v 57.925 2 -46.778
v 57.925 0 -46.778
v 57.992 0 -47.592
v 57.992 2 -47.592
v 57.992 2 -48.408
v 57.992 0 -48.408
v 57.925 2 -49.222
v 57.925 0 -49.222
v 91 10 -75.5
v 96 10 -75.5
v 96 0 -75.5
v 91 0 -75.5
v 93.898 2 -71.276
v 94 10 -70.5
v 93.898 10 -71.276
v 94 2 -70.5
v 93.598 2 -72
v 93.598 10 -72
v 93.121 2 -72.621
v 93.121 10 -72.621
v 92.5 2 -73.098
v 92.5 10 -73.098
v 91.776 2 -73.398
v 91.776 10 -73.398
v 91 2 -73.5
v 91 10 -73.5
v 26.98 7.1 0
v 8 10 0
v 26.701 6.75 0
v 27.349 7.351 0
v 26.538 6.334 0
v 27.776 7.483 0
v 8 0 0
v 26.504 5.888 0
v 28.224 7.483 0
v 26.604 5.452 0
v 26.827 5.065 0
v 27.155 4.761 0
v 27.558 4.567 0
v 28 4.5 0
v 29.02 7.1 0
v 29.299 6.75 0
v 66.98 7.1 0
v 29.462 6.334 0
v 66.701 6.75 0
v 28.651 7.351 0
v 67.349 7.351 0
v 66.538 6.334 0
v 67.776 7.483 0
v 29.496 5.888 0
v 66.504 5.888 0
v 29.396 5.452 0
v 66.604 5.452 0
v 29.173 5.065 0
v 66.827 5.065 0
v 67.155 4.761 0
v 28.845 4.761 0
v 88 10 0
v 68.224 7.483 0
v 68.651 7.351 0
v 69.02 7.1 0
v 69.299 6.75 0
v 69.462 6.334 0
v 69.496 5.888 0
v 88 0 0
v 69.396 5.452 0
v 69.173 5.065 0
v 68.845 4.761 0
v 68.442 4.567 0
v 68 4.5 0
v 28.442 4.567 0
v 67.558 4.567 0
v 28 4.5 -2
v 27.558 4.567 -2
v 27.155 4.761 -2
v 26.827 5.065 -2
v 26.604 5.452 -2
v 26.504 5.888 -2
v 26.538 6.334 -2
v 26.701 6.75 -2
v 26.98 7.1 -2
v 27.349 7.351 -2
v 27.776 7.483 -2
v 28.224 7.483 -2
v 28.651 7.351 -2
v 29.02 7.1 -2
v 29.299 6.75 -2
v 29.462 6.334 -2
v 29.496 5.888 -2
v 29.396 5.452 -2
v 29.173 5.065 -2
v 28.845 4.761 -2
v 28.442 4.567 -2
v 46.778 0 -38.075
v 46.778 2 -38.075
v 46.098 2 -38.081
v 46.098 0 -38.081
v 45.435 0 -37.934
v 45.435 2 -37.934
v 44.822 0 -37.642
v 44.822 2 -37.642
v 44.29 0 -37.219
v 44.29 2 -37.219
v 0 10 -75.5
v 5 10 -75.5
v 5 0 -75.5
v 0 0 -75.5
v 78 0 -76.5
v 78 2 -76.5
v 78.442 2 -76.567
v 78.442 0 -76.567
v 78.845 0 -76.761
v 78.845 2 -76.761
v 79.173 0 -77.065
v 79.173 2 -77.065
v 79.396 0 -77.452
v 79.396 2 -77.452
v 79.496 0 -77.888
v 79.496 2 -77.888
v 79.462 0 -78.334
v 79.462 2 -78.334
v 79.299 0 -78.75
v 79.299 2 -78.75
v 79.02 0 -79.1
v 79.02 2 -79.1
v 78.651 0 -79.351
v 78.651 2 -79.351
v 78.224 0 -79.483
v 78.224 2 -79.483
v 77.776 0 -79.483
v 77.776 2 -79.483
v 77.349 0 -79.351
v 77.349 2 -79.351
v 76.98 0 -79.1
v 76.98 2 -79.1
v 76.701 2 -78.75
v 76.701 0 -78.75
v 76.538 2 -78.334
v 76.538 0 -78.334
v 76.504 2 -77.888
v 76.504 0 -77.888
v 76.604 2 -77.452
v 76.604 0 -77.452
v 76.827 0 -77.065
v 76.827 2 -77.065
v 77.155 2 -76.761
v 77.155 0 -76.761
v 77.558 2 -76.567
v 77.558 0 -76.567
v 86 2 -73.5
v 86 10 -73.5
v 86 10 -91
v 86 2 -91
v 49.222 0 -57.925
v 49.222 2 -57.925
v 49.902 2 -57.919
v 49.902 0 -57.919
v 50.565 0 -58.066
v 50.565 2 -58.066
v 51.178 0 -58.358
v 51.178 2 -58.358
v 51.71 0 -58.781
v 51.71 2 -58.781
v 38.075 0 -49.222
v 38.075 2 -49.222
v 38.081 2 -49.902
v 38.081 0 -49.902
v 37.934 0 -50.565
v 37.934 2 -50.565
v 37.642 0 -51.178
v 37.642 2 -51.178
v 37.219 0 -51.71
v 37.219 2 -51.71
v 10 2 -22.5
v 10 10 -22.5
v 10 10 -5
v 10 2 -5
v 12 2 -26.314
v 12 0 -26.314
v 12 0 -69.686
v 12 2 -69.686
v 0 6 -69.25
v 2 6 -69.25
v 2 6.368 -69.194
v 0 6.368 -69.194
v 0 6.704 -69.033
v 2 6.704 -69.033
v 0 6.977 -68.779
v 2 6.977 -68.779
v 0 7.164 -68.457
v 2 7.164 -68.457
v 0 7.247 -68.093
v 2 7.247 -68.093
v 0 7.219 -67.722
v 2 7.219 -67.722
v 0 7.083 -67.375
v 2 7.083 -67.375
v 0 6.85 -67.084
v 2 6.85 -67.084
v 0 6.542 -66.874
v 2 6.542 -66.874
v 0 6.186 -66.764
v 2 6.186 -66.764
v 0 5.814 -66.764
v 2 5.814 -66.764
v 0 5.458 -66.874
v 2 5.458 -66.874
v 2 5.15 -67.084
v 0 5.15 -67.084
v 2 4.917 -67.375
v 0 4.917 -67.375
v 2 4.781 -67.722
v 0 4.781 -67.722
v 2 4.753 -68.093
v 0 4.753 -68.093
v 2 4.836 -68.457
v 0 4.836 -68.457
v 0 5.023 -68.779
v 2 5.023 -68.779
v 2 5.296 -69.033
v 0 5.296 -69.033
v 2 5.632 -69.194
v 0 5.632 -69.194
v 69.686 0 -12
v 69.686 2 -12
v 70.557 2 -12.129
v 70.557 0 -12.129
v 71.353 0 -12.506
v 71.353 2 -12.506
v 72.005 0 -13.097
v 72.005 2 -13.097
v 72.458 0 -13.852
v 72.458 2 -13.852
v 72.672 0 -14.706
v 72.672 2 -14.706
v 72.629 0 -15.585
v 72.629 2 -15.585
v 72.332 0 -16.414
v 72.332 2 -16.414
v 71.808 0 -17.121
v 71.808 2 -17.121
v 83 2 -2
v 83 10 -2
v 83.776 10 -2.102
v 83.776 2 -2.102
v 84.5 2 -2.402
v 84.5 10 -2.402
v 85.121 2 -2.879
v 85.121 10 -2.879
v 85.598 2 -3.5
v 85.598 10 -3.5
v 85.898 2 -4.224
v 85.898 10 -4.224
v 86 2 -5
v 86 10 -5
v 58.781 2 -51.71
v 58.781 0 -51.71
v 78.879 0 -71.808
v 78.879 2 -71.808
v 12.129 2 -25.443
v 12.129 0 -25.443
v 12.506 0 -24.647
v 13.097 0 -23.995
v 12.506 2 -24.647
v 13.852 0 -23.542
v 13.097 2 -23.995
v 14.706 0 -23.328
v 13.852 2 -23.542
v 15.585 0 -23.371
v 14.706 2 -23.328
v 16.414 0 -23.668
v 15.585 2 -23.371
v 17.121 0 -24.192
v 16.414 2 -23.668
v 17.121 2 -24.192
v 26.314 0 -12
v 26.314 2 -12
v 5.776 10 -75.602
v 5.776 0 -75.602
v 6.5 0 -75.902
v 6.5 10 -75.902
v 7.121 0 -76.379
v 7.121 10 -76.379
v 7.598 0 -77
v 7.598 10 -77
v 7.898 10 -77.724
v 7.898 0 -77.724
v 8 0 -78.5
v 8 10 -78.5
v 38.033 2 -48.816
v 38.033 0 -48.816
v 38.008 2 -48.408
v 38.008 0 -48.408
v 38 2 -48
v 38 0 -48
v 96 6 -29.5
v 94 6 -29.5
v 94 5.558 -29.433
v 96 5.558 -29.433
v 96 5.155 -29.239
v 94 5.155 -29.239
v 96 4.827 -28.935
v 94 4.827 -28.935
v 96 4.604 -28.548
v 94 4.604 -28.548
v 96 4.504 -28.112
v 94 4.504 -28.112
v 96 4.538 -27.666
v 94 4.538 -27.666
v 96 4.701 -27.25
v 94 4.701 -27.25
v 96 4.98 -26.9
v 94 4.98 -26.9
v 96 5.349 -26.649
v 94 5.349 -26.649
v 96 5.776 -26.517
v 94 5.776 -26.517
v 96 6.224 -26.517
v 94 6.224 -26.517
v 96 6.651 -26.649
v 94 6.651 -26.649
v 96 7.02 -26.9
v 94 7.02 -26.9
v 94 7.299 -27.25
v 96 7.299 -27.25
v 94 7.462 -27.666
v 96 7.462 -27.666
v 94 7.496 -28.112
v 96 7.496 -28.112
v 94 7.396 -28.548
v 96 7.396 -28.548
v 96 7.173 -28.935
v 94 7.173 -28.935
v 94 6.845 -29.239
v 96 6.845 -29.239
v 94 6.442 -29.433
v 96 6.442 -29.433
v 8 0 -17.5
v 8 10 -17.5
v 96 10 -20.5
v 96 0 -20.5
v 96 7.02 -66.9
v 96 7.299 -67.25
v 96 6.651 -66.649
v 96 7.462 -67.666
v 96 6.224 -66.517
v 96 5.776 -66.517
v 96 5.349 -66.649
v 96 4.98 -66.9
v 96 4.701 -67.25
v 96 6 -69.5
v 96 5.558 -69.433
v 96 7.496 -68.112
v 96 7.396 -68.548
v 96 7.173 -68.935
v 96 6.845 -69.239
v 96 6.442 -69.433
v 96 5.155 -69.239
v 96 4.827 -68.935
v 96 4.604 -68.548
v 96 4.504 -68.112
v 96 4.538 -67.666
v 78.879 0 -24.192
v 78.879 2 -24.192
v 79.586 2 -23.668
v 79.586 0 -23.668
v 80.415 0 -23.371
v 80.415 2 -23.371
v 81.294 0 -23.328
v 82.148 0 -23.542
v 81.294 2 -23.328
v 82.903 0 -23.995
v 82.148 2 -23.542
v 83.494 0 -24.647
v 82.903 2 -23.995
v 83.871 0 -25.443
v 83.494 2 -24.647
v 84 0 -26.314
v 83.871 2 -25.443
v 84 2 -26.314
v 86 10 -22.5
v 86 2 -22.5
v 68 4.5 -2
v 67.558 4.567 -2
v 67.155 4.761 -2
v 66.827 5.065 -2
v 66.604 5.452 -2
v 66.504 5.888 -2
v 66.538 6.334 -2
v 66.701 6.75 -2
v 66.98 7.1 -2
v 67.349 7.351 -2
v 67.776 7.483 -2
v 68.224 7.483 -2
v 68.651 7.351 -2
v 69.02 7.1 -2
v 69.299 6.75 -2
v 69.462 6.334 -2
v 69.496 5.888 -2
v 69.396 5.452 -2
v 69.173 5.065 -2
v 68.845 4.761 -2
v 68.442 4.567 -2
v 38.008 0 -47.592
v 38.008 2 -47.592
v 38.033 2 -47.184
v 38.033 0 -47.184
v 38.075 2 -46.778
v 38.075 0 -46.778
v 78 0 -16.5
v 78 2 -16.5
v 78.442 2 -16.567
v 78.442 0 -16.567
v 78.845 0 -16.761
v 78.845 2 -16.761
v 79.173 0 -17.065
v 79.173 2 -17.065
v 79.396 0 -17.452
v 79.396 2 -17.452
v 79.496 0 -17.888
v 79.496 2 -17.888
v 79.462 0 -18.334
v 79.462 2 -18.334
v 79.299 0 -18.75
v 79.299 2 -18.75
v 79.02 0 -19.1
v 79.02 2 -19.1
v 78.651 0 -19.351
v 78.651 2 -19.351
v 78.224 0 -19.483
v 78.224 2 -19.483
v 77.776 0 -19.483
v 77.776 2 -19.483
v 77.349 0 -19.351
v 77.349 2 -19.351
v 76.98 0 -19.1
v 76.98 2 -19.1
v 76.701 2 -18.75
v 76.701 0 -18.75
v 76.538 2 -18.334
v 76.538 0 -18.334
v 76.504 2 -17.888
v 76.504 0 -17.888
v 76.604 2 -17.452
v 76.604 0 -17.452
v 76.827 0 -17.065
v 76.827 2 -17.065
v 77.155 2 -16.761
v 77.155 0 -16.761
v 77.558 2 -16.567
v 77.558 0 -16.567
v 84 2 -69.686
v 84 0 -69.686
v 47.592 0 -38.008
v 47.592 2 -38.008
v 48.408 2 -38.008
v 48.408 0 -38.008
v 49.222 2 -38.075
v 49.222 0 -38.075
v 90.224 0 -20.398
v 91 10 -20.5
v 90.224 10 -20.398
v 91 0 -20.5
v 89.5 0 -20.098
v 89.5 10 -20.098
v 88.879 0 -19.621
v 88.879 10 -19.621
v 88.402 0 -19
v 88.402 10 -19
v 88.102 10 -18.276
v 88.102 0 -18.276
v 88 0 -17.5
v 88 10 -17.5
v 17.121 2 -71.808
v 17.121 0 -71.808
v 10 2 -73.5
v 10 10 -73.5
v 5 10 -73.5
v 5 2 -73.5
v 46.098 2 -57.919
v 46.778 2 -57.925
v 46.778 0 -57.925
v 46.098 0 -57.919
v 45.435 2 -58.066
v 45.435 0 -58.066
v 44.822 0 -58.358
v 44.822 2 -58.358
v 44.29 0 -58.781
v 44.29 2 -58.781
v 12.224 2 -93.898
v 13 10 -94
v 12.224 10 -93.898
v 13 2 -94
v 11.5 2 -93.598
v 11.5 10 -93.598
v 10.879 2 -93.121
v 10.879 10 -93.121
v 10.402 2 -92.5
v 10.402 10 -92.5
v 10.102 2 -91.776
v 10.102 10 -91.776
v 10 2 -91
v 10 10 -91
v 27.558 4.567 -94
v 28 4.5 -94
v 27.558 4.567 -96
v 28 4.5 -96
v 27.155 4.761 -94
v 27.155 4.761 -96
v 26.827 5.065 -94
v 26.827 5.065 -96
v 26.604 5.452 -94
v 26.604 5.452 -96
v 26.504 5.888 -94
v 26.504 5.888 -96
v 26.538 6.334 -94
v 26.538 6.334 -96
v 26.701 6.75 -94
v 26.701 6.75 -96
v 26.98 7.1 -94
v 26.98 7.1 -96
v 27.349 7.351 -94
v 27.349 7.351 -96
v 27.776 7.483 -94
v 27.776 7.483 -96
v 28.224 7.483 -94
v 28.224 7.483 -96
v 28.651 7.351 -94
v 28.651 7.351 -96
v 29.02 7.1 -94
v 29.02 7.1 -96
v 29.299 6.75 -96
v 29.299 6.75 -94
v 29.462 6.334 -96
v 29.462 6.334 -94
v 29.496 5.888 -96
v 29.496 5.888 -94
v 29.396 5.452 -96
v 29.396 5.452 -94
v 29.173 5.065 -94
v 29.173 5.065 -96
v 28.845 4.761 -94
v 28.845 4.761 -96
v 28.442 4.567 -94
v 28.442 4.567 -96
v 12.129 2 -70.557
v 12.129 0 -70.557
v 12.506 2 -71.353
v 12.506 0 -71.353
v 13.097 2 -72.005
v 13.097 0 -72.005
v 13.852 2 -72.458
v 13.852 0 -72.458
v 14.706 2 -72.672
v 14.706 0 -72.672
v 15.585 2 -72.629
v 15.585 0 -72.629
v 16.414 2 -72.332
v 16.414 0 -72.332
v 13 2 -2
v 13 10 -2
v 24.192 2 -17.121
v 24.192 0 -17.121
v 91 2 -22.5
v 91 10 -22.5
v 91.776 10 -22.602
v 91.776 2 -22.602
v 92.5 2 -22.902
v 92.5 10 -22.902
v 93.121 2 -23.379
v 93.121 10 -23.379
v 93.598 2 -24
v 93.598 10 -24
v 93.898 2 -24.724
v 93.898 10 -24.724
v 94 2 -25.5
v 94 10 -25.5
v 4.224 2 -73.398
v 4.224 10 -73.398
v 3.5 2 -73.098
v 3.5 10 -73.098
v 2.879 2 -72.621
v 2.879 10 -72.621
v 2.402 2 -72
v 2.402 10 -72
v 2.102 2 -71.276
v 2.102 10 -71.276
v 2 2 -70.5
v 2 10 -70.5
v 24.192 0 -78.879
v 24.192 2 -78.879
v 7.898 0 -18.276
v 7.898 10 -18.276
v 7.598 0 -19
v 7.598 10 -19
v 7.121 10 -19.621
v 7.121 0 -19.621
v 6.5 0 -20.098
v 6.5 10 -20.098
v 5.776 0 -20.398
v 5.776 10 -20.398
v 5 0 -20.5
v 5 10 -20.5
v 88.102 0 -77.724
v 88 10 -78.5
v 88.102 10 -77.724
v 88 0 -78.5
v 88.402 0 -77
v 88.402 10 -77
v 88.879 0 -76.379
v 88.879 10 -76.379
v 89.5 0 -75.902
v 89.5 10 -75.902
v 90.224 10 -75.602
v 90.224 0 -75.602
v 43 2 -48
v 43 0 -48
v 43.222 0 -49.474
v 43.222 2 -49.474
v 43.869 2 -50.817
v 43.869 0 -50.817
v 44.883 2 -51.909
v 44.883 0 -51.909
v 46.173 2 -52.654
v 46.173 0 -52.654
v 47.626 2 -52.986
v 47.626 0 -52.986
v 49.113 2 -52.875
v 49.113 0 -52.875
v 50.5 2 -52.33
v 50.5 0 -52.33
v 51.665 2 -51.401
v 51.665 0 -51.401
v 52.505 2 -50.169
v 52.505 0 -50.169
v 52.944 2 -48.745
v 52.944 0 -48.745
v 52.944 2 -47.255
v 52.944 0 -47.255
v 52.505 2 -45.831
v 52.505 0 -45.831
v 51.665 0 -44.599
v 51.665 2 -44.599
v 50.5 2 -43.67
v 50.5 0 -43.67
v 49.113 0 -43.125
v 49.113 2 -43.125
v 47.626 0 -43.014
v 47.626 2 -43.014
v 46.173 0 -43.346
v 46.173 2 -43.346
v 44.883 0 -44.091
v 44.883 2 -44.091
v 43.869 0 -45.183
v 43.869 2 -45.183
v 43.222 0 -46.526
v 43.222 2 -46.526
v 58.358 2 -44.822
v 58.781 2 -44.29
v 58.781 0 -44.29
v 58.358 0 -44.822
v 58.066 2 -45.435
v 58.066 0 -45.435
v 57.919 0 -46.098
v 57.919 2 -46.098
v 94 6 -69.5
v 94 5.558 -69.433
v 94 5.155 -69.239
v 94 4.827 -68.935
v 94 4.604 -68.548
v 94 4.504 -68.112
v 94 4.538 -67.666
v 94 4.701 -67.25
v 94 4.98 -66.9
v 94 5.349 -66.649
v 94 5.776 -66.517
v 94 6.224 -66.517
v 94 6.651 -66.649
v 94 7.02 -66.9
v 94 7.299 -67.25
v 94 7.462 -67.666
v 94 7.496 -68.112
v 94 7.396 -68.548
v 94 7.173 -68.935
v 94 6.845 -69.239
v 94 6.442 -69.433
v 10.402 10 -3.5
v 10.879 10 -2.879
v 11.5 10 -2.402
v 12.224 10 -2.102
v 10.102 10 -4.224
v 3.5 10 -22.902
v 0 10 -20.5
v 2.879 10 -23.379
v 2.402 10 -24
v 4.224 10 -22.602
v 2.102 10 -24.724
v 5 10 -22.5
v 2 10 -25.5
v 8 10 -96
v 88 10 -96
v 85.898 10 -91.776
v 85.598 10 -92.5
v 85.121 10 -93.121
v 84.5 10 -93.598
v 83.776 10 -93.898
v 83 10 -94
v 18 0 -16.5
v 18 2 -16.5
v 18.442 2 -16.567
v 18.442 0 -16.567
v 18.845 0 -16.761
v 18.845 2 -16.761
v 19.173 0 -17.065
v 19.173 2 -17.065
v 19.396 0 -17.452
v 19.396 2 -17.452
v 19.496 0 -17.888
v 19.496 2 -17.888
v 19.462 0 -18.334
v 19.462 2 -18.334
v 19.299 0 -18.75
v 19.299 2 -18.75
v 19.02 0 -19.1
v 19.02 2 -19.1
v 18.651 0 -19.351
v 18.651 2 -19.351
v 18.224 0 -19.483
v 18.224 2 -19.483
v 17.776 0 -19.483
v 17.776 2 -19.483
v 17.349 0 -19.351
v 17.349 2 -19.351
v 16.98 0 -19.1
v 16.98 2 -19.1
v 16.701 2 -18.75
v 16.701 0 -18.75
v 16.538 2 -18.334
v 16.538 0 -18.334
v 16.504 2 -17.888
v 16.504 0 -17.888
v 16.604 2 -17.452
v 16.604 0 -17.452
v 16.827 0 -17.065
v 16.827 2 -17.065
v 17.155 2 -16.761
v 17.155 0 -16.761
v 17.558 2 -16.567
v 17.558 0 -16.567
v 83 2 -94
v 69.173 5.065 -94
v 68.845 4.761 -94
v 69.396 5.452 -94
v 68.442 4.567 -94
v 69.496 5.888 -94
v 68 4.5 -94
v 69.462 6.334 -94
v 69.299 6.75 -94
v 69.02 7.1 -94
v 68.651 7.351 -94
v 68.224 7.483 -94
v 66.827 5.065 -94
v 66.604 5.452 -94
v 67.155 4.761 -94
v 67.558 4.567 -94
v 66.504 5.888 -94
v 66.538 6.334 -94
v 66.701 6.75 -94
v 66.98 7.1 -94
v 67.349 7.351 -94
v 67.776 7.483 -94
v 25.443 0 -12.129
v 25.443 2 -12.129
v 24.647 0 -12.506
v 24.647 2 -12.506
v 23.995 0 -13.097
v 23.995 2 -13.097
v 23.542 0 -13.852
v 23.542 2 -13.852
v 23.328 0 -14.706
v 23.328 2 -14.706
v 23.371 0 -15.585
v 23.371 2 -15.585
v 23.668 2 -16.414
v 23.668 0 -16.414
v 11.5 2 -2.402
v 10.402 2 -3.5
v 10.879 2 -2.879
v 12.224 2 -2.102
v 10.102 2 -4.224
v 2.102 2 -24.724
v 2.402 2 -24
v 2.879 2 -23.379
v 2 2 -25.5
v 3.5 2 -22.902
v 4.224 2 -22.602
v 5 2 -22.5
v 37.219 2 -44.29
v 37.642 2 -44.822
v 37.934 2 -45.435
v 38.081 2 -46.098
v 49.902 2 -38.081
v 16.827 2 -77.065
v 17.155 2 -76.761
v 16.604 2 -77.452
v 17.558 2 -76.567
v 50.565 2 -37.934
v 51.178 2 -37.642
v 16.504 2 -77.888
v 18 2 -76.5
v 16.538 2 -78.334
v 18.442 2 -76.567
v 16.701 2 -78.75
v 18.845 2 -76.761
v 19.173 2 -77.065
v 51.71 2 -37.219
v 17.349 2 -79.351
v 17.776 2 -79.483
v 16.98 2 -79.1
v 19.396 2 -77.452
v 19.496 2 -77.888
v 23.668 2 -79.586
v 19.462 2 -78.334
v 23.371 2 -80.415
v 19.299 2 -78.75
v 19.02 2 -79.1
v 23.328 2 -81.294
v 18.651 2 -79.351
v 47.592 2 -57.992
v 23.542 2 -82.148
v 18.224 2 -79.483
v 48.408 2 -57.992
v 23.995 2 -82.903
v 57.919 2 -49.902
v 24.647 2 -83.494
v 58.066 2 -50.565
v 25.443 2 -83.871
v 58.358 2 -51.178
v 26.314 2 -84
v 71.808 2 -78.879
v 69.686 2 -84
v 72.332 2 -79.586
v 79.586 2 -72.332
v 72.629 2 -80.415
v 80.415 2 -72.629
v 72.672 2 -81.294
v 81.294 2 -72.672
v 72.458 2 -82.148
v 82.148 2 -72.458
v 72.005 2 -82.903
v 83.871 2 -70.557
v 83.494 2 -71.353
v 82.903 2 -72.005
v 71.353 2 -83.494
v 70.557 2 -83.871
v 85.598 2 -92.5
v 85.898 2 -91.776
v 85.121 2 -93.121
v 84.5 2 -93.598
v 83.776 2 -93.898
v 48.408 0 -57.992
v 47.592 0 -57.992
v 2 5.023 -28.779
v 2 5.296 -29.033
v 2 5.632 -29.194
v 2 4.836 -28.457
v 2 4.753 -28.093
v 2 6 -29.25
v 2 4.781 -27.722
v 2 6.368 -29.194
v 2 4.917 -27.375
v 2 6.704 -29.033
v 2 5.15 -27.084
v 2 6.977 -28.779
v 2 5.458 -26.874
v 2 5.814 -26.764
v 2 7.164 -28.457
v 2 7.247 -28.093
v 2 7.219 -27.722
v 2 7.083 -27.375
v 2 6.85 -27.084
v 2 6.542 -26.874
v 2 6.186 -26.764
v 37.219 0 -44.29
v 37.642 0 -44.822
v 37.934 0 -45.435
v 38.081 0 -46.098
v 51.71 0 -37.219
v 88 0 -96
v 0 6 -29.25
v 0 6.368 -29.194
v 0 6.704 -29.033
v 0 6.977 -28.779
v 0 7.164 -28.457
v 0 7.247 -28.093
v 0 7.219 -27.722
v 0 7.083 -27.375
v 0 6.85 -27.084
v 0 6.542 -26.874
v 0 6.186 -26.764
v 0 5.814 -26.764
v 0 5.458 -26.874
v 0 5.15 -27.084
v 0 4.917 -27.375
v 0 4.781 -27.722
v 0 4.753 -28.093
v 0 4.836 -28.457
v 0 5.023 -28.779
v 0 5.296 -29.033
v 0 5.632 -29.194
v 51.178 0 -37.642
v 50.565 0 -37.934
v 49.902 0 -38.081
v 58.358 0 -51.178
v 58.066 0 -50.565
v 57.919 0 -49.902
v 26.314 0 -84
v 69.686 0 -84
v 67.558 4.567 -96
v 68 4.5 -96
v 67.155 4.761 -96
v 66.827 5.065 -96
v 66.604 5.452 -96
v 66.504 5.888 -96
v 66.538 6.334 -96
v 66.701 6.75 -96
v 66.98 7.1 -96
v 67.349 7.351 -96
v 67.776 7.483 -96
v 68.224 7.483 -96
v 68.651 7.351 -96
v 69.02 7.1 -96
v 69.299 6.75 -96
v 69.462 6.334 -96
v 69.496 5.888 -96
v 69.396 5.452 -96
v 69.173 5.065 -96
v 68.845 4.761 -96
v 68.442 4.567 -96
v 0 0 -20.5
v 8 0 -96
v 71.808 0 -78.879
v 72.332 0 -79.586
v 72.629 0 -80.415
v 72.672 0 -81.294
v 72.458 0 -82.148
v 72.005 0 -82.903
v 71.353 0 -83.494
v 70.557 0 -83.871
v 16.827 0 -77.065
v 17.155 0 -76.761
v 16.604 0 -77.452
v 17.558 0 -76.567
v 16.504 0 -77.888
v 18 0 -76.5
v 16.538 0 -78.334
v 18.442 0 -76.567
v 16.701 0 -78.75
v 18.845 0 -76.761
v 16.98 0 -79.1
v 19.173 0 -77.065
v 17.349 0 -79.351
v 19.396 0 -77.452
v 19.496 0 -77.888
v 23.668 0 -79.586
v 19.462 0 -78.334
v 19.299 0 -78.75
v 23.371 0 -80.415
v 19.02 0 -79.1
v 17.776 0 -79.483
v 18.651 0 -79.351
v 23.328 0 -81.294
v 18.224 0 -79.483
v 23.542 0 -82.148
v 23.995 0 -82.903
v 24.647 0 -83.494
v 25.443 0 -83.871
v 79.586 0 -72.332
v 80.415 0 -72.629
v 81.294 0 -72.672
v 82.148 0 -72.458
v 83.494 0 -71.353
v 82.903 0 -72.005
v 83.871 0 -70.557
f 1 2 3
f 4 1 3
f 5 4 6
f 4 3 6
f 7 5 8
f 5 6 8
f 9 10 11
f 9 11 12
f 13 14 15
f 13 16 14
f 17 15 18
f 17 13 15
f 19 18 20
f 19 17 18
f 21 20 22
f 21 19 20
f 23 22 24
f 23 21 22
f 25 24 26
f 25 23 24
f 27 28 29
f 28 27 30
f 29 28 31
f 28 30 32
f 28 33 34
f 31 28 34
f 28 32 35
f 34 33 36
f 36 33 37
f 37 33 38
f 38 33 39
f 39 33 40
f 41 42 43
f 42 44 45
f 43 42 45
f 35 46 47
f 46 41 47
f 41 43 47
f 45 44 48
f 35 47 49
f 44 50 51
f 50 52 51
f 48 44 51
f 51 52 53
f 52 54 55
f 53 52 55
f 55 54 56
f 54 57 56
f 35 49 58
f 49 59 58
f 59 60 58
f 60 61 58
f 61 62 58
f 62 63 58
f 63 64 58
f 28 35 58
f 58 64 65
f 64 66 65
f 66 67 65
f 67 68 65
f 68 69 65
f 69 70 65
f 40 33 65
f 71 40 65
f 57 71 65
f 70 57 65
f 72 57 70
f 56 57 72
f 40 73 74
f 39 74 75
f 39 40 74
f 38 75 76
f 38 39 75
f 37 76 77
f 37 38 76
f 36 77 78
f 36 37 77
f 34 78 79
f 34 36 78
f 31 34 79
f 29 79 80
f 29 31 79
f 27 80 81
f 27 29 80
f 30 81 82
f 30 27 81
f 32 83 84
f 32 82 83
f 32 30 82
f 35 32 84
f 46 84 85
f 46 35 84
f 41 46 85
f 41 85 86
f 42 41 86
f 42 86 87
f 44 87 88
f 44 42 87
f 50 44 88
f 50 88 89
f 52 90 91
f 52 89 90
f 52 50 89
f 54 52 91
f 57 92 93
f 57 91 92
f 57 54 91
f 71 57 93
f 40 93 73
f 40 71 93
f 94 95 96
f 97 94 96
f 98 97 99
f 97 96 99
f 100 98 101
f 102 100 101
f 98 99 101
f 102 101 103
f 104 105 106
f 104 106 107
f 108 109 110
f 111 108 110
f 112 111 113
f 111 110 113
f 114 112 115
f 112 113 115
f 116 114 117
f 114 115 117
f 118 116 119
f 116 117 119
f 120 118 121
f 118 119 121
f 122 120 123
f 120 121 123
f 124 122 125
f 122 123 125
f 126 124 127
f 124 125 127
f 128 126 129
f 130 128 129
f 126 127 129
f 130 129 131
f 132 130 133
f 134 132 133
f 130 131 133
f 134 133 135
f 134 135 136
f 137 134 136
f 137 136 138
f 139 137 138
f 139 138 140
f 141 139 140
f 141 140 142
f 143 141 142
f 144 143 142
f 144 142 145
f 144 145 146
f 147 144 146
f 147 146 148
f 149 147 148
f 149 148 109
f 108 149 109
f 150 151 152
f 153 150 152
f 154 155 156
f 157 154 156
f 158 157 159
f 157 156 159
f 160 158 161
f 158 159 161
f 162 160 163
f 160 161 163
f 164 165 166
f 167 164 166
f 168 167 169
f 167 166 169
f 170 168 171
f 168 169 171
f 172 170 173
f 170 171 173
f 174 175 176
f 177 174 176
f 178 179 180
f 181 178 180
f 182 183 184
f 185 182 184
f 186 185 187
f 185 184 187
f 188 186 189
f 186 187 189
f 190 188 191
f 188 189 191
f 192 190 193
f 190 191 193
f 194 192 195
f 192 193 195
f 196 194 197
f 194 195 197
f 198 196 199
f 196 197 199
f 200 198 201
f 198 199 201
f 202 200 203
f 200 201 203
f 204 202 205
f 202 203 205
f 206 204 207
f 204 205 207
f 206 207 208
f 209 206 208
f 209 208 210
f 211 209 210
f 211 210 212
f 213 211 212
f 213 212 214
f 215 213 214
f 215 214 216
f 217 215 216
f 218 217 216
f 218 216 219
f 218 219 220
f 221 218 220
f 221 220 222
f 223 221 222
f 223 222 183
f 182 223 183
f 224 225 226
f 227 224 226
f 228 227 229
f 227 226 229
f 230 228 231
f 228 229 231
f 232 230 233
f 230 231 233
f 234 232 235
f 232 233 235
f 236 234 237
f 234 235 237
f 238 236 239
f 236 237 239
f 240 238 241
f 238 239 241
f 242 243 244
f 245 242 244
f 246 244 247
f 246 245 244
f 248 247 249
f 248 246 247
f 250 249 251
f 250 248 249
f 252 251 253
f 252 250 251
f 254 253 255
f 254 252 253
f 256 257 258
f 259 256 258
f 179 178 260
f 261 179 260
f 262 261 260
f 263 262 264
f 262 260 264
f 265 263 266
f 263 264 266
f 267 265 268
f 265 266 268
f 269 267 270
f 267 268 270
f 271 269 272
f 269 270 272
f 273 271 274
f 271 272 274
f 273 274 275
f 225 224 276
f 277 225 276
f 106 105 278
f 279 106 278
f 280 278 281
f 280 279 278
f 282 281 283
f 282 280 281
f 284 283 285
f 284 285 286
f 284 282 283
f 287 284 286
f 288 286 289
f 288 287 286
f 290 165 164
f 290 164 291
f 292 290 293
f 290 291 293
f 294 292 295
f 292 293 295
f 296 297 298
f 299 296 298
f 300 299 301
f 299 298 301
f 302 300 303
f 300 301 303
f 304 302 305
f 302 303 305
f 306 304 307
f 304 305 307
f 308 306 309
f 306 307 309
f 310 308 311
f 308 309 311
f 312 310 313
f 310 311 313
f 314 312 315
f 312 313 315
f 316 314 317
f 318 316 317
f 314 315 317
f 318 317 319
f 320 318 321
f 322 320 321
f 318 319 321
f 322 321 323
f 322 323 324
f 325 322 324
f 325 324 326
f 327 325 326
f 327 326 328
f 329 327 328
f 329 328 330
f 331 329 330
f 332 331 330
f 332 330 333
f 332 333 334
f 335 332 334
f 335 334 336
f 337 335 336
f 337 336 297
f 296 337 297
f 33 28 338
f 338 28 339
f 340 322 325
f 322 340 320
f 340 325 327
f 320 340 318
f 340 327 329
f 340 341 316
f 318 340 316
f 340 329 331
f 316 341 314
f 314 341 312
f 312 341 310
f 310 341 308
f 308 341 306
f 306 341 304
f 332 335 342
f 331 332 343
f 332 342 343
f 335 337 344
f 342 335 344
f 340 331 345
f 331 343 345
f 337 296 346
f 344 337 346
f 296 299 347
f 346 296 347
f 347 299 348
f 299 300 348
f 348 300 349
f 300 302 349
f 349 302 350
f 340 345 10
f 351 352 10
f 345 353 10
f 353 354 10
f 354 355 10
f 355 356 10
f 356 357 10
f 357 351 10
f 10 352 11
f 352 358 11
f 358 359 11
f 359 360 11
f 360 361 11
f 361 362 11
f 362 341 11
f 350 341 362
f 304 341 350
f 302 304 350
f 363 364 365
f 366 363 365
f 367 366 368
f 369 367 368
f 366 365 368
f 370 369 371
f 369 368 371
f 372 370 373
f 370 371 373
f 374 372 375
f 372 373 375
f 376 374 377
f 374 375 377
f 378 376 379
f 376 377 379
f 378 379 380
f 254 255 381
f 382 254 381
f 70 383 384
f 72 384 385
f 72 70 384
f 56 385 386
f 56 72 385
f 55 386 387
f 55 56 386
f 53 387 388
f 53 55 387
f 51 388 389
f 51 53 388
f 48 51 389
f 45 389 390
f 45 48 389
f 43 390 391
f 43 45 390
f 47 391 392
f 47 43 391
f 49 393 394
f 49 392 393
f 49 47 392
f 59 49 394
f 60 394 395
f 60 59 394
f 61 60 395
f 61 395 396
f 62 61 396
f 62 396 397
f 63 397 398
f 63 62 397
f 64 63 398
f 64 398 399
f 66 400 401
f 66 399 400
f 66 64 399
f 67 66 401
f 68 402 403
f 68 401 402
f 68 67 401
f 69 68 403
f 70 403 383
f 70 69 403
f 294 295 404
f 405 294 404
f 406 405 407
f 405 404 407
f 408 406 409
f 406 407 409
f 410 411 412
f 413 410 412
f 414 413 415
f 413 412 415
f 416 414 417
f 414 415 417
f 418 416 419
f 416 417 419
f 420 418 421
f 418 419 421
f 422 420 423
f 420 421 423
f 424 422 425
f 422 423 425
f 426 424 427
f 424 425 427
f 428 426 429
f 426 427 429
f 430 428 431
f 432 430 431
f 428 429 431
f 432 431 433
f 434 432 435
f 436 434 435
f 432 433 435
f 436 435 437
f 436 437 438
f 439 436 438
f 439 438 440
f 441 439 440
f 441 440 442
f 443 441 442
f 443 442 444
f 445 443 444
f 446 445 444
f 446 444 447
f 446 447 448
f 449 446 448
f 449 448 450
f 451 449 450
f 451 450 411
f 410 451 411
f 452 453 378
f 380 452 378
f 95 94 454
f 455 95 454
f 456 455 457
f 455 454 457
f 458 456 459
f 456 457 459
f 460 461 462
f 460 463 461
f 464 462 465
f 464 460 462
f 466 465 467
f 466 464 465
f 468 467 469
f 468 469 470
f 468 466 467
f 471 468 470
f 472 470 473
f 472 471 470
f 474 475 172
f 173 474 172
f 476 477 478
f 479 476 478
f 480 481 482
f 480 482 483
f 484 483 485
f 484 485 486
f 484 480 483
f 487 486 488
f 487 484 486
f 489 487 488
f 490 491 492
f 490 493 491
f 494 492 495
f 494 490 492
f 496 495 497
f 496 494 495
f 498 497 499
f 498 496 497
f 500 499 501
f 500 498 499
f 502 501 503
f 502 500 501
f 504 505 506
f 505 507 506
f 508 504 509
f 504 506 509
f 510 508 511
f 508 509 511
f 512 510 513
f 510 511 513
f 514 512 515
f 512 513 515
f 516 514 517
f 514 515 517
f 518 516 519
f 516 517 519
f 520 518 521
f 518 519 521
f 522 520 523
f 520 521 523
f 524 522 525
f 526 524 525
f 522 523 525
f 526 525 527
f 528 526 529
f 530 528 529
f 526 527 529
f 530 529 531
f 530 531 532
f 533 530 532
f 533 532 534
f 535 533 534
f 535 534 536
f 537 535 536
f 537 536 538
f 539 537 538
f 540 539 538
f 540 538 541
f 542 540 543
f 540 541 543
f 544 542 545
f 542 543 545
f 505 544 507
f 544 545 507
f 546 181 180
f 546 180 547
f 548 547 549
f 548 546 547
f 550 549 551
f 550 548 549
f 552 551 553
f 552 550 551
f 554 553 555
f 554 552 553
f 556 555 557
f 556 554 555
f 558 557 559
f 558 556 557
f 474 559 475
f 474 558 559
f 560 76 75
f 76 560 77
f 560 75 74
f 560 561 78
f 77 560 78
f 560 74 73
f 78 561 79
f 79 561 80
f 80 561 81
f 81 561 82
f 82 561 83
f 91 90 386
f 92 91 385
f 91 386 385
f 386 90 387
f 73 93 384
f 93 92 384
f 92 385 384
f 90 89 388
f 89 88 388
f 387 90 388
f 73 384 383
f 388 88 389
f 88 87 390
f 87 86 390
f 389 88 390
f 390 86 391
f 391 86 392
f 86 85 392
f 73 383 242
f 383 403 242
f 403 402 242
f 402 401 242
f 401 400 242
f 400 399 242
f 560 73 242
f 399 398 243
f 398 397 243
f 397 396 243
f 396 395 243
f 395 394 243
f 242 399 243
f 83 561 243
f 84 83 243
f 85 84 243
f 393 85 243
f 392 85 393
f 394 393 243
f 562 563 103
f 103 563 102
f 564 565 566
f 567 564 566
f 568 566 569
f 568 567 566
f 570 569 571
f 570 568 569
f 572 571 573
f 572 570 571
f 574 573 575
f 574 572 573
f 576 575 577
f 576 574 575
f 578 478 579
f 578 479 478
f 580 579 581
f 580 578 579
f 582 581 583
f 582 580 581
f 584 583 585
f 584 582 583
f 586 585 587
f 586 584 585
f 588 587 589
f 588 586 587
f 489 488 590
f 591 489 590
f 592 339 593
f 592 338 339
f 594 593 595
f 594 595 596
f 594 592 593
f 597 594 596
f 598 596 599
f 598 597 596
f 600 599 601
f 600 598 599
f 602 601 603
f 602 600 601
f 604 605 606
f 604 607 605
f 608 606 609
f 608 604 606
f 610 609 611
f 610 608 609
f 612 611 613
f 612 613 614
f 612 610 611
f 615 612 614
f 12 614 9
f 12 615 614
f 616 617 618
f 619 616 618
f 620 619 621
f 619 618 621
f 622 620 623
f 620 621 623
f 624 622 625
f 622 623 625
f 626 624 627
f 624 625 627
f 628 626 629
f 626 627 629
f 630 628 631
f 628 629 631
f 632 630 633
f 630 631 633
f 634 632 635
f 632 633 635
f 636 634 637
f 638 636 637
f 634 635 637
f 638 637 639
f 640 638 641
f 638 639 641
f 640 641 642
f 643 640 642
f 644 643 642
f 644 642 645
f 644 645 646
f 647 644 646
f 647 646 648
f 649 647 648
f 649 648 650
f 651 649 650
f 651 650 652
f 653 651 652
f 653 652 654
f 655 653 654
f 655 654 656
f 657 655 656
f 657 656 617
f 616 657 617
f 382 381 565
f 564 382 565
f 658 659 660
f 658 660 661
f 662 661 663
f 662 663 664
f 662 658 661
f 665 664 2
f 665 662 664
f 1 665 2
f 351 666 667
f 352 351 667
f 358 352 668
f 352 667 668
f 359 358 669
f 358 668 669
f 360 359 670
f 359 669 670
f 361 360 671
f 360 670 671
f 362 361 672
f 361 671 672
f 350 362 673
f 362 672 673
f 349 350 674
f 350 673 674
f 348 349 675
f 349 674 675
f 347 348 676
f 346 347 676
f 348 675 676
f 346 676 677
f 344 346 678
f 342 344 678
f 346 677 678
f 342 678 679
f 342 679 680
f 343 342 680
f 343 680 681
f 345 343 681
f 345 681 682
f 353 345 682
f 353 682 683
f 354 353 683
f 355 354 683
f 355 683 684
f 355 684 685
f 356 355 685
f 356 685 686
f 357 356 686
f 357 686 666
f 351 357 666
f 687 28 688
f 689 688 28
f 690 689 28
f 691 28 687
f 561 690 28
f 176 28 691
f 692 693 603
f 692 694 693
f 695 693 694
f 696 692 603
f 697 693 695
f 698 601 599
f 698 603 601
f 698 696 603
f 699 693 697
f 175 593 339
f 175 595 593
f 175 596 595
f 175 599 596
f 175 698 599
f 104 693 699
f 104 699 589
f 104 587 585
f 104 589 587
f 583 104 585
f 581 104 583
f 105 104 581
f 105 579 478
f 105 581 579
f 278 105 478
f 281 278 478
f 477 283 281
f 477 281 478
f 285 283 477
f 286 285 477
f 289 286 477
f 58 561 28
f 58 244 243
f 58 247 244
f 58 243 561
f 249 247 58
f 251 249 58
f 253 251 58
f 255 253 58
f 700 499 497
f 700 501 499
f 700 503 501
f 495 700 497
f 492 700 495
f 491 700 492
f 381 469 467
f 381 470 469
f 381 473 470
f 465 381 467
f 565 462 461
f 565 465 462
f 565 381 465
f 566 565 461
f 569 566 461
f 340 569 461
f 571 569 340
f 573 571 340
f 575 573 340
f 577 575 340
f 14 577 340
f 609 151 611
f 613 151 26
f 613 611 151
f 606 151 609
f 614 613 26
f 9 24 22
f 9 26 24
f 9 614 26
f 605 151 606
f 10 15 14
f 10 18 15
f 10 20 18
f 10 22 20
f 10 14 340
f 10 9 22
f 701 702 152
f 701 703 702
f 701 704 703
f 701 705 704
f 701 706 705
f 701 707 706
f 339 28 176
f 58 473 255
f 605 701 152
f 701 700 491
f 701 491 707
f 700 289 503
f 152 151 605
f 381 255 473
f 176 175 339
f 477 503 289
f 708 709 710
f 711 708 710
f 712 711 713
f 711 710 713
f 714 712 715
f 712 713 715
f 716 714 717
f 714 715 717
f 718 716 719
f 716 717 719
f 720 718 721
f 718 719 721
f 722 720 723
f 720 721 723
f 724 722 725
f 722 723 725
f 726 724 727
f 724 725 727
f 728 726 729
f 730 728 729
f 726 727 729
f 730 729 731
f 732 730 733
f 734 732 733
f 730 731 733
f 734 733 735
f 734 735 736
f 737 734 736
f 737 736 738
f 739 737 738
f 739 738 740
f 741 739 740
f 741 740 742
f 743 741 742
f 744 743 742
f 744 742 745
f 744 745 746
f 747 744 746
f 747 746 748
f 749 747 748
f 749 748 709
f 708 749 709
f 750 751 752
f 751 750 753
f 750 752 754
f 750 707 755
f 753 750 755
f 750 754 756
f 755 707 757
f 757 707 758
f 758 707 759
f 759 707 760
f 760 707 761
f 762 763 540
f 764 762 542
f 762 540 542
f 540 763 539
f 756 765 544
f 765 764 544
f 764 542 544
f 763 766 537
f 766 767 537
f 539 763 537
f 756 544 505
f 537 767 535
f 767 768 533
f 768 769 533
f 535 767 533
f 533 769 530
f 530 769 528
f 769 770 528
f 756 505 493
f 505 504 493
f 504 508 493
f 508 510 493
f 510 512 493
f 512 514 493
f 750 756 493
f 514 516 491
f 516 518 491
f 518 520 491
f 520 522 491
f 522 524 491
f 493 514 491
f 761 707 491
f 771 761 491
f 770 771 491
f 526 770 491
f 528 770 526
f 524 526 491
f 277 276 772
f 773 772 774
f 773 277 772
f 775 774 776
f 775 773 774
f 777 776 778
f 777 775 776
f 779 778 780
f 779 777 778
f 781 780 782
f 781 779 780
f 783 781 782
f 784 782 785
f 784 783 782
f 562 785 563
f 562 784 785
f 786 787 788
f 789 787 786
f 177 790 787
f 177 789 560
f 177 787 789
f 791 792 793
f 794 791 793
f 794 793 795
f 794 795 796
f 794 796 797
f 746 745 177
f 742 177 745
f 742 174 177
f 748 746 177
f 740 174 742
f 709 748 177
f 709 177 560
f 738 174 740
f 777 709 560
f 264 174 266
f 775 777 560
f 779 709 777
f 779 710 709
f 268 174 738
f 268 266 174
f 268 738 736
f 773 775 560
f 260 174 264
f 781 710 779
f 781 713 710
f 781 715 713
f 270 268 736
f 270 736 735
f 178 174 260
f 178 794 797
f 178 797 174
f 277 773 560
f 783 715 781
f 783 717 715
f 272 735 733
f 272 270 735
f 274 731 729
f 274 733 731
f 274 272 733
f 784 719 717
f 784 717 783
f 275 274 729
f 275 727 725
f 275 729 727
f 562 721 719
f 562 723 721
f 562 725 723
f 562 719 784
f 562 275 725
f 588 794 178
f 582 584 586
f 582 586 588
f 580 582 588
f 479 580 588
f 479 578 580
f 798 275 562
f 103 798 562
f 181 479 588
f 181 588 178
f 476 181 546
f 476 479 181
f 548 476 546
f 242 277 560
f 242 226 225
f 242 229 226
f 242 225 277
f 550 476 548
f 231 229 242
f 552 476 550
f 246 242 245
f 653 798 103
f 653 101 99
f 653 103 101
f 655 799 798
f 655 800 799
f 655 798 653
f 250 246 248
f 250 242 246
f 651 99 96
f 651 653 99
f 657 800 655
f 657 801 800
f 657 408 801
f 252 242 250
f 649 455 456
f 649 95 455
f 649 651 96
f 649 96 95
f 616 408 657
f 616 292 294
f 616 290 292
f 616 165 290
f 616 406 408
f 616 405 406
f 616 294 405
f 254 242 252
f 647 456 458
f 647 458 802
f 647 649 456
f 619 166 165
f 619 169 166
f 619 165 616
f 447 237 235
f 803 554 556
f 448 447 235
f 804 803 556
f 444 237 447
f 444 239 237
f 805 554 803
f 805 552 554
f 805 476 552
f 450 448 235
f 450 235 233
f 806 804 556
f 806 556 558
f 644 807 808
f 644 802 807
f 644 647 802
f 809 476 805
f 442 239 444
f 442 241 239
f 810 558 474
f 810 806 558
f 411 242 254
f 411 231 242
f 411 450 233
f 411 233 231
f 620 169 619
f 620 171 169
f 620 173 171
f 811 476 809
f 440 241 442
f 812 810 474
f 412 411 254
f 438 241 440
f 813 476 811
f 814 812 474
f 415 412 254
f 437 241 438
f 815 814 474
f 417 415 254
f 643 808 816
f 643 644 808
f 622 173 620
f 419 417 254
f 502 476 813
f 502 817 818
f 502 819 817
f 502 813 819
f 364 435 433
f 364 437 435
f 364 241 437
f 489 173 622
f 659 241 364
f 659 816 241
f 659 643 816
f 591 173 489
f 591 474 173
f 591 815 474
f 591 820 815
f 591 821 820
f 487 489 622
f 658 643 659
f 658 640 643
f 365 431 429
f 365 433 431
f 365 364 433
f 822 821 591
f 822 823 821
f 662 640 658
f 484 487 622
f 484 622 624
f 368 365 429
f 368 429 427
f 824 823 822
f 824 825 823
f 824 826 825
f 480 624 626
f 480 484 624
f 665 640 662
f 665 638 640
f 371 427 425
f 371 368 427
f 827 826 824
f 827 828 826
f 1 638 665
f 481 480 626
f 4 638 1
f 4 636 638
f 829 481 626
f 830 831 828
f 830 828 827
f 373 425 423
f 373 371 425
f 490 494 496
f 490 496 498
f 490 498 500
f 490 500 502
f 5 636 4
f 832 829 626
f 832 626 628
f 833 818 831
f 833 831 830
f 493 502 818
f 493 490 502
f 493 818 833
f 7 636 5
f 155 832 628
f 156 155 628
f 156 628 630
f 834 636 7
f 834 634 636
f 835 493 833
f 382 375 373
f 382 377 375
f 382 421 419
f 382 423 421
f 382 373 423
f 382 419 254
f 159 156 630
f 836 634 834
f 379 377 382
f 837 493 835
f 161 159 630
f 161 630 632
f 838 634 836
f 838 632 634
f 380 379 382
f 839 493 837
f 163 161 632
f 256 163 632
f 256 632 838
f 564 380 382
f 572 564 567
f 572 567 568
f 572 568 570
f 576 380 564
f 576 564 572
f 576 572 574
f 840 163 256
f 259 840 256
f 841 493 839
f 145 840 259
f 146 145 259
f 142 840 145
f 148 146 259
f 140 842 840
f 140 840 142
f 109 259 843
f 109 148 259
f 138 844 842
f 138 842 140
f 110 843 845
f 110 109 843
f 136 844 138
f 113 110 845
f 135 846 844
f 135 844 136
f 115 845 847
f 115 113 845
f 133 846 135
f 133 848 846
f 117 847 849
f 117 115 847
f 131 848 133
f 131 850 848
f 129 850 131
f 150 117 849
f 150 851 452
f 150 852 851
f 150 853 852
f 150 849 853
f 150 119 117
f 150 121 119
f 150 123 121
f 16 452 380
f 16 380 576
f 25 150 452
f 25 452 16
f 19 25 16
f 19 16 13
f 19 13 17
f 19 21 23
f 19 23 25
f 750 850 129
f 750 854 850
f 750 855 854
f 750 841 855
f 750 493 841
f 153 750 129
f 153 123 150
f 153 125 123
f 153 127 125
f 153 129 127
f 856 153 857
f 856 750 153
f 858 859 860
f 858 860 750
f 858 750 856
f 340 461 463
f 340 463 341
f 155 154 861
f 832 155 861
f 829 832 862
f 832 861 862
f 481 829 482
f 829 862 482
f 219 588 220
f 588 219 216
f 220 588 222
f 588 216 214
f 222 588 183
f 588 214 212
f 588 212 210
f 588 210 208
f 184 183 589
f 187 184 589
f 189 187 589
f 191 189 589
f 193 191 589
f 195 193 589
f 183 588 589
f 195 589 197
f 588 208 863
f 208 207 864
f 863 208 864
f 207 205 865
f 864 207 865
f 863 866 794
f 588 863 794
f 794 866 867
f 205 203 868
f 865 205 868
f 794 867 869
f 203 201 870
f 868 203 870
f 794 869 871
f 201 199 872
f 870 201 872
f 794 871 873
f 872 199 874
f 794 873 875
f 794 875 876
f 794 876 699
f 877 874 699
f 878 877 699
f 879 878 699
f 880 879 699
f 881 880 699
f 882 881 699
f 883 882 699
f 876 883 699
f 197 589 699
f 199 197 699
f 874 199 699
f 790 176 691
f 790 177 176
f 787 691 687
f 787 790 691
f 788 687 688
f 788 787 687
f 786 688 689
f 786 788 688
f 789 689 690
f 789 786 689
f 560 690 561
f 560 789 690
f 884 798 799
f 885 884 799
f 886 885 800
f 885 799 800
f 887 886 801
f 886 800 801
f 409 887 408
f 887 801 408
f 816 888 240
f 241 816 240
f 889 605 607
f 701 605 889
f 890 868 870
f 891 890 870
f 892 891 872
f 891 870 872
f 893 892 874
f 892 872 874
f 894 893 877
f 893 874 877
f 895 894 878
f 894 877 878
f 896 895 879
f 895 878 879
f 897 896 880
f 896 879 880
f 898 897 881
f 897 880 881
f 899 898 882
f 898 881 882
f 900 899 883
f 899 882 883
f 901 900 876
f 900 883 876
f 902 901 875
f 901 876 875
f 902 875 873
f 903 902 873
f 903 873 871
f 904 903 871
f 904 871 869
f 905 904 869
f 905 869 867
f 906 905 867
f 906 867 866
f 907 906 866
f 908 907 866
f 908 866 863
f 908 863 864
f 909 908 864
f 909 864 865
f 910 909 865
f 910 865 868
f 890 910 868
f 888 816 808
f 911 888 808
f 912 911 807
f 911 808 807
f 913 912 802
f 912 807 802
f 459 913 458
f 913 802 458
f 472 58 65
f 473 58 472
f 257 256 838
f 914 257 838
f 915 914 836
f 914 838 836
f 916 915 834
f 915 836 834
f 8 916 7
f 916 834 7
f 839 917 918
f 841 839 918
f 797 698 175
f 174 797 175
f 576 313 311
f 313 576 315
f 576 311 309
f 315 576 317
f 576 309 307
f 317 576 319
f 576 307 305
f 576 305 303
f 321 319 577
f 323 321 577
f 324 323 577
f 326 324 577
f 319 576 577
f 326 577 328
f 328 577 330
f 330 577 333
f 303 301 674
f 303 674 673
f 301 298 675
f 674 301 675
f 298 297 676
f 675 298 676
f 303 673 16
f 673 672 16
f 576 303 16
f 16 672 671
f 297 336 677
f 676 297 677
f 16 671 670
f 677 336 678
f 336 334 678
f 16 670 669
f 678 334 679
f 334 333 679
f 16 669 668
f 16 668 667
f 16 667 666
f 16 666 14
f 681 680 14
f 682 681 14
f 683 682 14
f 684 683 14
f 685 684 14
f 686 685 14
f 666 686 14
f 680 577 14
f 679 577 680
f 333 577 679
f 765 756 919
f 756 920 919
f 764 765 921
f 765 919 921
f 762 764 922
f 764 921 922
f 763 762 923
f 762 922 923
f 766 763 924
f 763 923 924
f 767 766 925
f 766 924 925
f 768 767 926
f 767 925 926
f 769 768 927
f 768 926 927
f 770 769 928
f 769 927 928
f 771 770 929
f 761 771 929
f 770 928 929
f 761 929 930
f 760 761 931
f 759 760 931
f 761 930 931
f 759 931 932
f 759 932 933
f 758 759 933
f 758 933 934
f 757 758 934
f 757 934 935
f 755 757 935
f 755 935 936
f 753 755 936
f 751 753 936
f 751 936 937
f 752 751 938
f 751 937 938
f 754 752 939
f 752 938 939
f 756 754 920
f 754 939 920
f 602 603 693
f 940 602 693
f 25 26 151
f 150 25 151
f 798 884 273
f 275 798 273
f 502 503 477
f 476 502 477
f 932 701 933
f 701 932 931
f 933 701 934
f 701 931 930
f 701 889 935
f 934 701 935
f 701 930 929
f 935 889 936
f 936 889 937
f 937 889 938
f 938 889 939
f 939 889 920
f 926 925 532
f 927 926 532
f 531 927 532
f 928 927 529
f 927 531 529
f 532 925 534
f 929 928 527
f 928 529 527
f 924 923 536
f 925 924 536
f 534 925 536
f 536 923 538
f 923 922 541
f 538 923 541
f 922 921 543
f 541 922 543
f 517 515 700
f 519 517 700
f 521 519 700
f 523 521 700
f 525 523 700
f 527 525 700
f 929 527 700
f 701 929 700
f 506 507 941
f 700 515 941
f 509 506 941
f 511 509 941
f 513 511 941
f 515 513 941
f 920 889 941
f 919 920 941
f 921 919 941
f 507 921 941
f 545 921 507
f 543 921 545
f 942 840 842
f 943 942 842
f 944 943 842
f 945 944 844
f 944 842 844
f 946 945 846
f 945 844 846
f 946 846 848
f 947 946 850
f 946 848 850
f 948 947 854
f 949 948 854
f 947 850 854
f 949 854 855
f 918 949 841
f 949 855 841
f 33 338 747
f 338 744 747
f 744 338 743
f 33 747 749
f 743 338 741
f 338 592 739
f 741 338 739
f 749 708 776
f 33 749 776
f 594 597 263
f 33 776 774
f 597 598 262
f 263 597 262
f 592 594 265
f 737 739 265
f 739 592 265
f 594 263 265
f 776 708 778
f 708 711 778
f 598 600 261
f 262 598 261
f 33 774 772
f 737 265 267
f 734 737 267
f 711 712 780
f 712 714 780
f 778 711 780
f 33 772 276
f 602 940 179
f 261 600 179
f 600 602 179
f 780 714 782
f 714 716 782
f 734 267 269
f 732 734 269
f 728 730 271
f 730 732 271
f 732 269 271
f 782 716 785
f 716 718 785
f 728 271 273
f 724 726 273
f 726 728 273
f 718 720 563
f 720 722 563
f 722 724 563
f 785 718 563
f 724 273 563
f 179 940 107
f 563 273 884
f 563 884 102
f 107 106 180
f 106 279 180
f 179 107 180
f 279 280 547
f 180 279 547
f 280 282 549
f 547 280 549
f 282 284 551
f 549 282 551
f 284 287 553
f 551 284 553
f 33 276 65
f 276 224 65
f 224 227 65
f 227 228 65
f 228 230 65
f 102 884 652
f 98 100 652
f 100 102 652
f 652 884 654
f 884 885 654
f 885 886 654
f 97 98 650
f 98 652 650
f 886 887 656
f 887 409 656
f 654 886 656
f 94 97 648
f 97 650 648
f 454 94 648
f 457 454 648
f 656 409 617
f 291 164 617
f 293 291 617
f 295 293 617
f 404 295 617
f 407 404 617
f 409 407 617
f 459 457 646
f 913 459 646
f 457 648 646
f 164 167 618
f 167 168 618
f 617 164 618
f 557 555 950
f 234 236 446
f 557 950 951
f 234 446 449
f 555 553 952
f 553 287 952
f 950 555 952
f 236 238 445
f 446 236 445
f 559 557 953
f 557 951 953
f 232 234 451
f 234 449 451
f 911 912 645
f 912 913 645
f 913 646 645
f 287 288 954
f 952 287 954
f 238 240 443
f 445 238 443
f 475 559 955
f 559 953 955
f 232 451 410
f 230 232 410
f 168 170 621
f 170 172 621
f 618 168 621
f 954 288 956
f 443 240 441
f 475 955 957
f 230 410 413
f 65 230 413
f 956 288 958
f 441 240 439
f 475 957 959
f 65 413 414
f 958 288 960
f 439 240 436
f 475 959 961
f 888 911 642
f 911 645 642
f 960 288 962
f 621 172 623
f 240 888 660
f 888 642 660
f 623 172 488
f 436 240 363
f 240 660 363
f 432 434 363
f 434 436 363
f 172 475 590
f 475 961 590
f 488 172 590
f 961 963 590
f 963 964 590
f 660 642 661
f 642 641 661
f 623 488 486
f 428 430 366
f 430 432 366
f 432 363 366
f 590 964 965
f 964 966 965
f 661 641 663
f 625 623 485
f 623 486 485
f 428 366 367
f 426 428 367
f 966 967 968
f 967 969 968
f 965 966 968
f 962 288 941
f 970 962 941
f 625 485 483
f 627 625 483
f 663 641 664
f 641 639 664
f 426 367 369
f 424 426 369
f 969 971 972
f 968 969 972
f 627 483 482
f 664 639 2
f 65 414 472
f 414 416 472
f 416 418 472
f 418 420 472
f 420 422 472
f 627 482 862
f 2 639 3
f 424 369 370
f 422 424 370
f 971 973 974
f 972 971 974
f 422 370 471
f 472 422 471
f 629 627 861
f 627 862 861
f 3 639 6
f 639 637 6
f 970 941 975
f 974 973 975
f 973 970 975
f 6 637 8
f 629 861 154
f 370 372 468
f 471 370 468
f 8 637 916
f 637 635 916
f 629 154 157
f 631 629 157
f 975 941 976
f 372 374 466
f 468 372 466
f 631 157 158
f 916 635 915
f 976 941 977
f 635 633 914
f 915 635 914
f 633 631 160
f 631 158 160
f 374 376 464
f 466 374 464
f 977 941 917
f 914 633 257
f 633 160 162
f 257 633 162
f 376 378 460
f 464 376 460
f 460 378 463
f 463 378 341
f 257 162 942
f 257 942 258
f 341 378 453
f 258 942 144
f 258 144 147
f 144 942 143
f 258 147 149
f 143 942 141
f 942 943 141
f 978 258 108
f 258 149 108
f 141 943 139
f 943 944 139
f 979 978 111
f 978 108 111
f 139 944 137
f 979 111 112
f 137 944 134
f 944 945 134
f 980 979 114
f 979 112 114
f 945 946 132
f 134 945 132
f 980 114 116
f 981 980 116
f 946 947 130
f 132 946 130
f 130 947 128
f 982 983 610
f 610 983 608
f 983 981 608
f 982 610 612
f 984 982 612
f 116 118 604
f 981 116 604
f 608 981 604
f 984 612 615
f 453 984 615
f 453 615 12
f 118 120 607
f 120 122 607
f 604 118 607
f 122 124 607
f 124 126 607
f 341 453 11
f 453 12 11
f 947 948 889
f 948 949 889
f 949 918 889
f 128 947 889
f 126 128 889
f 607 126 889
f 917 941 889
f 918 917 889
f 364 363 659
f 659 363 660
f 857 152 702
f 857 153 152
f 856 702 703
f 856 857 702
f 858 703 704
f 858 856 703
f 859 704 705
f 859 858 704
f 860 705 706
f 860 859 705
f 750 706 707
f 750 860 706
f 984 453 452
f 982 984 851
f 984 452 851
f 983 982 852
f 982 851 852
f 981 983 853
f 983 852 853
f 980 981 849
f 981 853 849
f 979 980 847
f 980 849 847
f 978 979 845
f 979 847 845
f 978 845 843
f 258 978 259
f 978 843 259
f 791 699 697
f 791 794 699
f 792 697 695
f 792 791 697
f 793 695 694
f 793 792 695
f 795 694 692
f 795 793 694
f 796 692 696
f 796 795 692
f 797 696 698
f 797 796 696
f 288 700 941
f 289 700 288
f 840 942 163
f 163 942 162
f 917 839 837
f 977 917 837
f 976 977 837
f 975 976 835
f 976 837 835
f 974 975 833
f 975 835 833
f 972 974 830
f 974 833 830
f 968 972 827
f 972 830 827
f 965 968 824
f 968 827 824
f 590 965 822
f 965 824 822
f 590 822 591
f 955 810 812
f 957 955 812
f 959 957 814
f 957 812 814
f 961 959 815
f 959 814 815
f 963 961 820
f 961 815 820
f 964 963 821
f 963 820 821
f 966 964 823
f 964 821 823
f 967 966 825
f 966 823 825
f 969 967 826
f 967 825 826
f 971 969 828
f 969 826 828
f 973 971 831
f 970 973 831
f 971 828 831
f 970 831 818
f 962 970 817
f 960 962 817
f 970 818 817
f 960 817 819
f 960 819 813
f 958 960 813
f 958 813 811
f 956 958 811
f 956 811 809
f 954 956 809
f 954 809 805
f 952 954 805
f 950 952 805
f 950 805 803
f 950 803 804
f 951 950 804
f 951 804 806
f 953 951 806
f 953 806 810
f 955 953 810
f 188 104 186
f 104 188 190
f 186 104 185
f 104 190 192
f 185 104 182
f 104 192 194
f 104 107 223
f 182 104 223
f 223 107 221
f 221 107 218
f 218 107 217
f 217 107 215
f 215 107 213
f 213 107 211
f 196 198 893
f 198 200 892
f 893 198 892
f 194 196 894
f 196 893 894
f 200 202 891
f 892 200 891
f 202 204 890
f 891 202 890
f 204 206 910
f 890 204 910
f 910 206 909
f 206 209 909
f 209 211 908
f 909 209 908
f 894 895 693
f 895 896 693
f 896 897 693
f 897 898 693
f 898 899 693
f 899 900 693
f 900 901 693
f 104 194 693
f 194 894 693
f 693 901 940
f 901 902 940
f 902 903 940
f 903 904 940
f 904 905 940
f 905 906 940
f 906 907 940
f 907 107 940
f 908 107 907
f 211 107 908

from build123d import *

# Parameters (mm, degrees)
BOSS_EXTRUDE1_DEPTH             = 10
SKETCH2_R                       = 5
CUT_EXTRUDE1_DEPTH              = 11
FILLET1_R                       = 3
CUT_EXTRUDE4_DEPTH              = 11
CUT_EXTRUDE5_DEPTH              = 8
FILLET2_R                       = 3
F_3_0MM_DOWEL_HOLE1_AT_2_COUNT  = 2
F_3_0MM_DOWEL_HOLE1_AT_2_PITCH  = 40
TAP_DRILL_FOR_M3X0_5_TAP1_D     = 2.5
TAP_DRILL_FOR_M3X0_5_TAP1_DEPTH = 2
F_3_0MM_DOWEL_HOLE3_D           = 3
F_3_0MM_DOWEL_HOLE4_D           = 3
F_3_0MM_DOWEL_HOLE4_DEPTH       = 2


with BuildPart() as part:
    # Sketch1 → Boss-Extrude1 (new body)
    with BuildSketch(Plane(origin=(0, 0, 0), x_dir=(1, 0, 0), z_dir=(0, 1, 0))):
        Polygon((0, 88), (0, 8), (8, 0), (88, 0), (96, 8), (96, 88), (88, 96), (8, 96), align=None)
    extrude(amount=BOSS_EXTRUDE1_DEPTH)

    # Sketch2 → Cut-Extrude1 (cut, through all)
    with BuildSketch(Plane(origin=(0, 0, 0), x_dir=(-1, 0, 0), z_dir=(0, -1, 0))):
        with BuildLine():
            Line((-45.411809549, 57.659258263), (-19.071067812, 84))
            Line((-19.071067812, 84), (-76.928932188, 84))
            Line((-76.928932188, 84), (-50.588190451, 57.659258263))
            ThreePointArc((-50.588190451, 57.659258263), (-48, 58), (-45.411809549, 57.659258263))
        make_face()
        with BuildLine():
            Line((-12, 76.928932188), (-38.340741737, 50.588190451))
            ThreePointArc((-38.340741737, 50.588190451), (-38.085551386, 49.305261922), (-38, 48))
            ThreePointArc((-38, 48), (-38.085551386, 46.694738078), (-38.340741737, 45.411809549))
            Line((-38.340741737, 45.411809549), (-12, 19.071067812))
            Line((-12, 19.071067812), (-12, 76.928932188))
        make_face()
        with BuildLine():
            Line((-19.071067812, 12), (-45.411809549, 38.340741737))
            ThreePointArc((-45.411809549, 38.340741737), (-48, 38), (-50.588190451, 38.340741737))
            Line((-50.588190451, 38.340741737), (-76.928932188, 12))
            Line((-76.928932188, 12), (-19.071067812, 12))
        make_face()
        with BuildLine():
            ThreePointArc((-57.659258263, 45.411809549), (-58, 48), (-57.659258263, 50.588190451))
            Line((-57.659258263, 50.588190451), (-84, 76.928932188))
            Line((-84, 76.928932188), (-84, 19.071067812))
            Line((-84, 19.071067812), (-57.659258263, 45.411809549))
        make_face()
        with Locations((-48, 48)):
            Circle(SKETCH2_R)
    extrude(amount=-CUT_EXTRUDE1_DEPTH, mode=Mode.SUBTRACT)

    # Fillet1
    fillet1_edges = [part.edges().sort_by_distance(p)[0] for p in [
        (50.588190451, 5, -38.340741737),
        (45.411809549, 5, -38.340741737),
        (19.071067812, 5, -12),
        (76.928932188, 5, -12),
        (38.340741737, 5, -45.411809549),
        (38.340741737, 5, -50.588190451),
        (12, 5, -76.928932188),
        (12, 5, -19.071067812),
        (57.659258263, 5, -50.588190451),
        (57.659258263, 5, -45.411809549),
        (84, 5, -19.071067812),
        (84, 5, -76.928932188),
        (45.411809549, 5, -57.659258263),
        (50.588190451, 5, -57.659258263),
        (76.928932188, 5, -84),
        (19.071067812, 5, -84),
    ]]
    fillet(fillet1_edges, radius=FILLET1_R)

    # Sketch5 → Cut-Extrude4 (cut, through all)
    with BuildSketch(Plane(origin=(0, 10, 0), x_dir=(1, 0, 0), z_dir=(0, 1, 0))):
        Polygon((8, 0), (8, 20.5), (0, 20.5), (0, 8), align=None)
        Polygon((96, 8), (88, 0), (88, 20.5), (96, 20.5), align=None)
        Polygon((96, 75.5), (88, 75.5), (88, 96), (96, 88), align=None)
        Polygon((8, 96), (8, 75.5), (0, 75.5), (0, 88), align=None)
    extrude(amount=-CUT_EXTRUDE4_DEPTH, mode=Mode.SUBTRACT)

    # Sketch6 → Cut-Extrude5 (cut)
    with BuildSketch(Plane(origin=(0, 10, 0), x_dir=(1, 0, 0), z_dir=(0, 1, 0))):
        Polygon((86, 73.5), (86, 94), (10, 94), (10, 73.5), (2, 73.5), (2, 22.5), (10, 22.5), (10, 2), (86, 2), (86, 22.5), (94, 22.5), (94, 73.5), align=None)
    extrude(amount=-CUT_EXTRUDE5_DEPTH, mode=Mode.SUBTRACT)

    # Fillet2
    fillet2_edges = [part.edges().sort_by_distance(p)[0] for p in [
        (8, 5, -75.5),
        (88, 5, -75.5),
        (88, 5, -20.5),
        (8, 5, -20.5),
        (94, 6, -73.5),
        (94, 6, -22.5),
        (86, 6, -2),
        (10, 6, -2),
        (2, 6, -22.5),
        (2, 6, -73.5),
        (10, 6, -94),
        (86, 6, -94),
    ]]
    fillet(fillet2_edges, radius=FILLET2_R)

    # Sketch13 → Ø3.0mm Dowel Hole1 (revolve, cut)
    with BuildSketch(Plane(origin=(28, 6, 0), x_dir=(0, -1, 0), z_dir=(1, 0, 0))):
        Polygon((0, 0), (0, 8.401290929), (1.5, 7.5), (1.5, 0), align=None)
    f_3_0mm_dowel_hole1 = revolve(axis=Axis((28, 6, 6.35), (0, 0, -1)), mode=Mode.SUBTRACT)

    # Ø3.0mm Dowel Hole1 at 2: Ø3.0mm Dowel Hole1 ×2
    with Locations(*[(i * F_3_0MM_DOWEL_HOLE1_AT_2_PITCH, 0, 0) for i in range(1, F_3_0MM_DOWEL_HOLE1_AT_2_COUNT)]):
        add(f_3_0mm_dowel_hole1, mode=Mode.SUBTRACT)

    # Tap Drill for M3x0.5 Tap1
    with Locations(Plane.ZY):
        with Locations((-68, 6), (-28, 6)):
            Hole(TAP_DRILL_FOR_M3X0_5_TAP1_D / 2, depth=TAP_DRILL_FOR_M3X0_5_TAP1_DEPTH)

    # Mirror1: Ø3.0mm Dowel Hole1 across plane
    add(f_3_0mm_dowel_hole1.mirror(Plane.XY.offset(-48)), mode=Mode.SUBTRACT)

    # Mirror1 copy 1 sketch → Mirror1 copy 1 (revolve, cut)
    with BuildSketch(Plane(origin=(68, 6, -96), x_dir=(0, -1, 0), z_dir=(1, 0, 0))):
        Polygon((0, 0), (0, -8.401290929), (1.5, -7.5), (1.5, 0), align=None)
    revolve(axis=Axis((68, 6, -102.35), (0, 0, -1)), mode=Mode.SUBTRACT)

    # Ø3.0mm Dowel Hole3 (through all)
    with Locations(Plane(origin=(78, 0, -18), x_dir=(0, 0, -1), z_dir=(0, -1, 0))):
        with Locations((0, 0), (60, 0), (60, -60), (0, -60)):
            Hole(F_3_0MM_DOWEL_HOLE3_D / 2)

    # Ø3.0mm Dowel Hole4
    with Locations(Plane(origin=(96, 6, -68), x_dir=(0, 0, 1), z_dir=(1, 0, 0))):
        with Locations((0, 0), (40, 0)):
            Hole(F_3_0MM_DOWEL_HOLE4_D / 2, depth=F_3_0MM_DOWEL_HOLE4_DEPTH)


solid = part.part
